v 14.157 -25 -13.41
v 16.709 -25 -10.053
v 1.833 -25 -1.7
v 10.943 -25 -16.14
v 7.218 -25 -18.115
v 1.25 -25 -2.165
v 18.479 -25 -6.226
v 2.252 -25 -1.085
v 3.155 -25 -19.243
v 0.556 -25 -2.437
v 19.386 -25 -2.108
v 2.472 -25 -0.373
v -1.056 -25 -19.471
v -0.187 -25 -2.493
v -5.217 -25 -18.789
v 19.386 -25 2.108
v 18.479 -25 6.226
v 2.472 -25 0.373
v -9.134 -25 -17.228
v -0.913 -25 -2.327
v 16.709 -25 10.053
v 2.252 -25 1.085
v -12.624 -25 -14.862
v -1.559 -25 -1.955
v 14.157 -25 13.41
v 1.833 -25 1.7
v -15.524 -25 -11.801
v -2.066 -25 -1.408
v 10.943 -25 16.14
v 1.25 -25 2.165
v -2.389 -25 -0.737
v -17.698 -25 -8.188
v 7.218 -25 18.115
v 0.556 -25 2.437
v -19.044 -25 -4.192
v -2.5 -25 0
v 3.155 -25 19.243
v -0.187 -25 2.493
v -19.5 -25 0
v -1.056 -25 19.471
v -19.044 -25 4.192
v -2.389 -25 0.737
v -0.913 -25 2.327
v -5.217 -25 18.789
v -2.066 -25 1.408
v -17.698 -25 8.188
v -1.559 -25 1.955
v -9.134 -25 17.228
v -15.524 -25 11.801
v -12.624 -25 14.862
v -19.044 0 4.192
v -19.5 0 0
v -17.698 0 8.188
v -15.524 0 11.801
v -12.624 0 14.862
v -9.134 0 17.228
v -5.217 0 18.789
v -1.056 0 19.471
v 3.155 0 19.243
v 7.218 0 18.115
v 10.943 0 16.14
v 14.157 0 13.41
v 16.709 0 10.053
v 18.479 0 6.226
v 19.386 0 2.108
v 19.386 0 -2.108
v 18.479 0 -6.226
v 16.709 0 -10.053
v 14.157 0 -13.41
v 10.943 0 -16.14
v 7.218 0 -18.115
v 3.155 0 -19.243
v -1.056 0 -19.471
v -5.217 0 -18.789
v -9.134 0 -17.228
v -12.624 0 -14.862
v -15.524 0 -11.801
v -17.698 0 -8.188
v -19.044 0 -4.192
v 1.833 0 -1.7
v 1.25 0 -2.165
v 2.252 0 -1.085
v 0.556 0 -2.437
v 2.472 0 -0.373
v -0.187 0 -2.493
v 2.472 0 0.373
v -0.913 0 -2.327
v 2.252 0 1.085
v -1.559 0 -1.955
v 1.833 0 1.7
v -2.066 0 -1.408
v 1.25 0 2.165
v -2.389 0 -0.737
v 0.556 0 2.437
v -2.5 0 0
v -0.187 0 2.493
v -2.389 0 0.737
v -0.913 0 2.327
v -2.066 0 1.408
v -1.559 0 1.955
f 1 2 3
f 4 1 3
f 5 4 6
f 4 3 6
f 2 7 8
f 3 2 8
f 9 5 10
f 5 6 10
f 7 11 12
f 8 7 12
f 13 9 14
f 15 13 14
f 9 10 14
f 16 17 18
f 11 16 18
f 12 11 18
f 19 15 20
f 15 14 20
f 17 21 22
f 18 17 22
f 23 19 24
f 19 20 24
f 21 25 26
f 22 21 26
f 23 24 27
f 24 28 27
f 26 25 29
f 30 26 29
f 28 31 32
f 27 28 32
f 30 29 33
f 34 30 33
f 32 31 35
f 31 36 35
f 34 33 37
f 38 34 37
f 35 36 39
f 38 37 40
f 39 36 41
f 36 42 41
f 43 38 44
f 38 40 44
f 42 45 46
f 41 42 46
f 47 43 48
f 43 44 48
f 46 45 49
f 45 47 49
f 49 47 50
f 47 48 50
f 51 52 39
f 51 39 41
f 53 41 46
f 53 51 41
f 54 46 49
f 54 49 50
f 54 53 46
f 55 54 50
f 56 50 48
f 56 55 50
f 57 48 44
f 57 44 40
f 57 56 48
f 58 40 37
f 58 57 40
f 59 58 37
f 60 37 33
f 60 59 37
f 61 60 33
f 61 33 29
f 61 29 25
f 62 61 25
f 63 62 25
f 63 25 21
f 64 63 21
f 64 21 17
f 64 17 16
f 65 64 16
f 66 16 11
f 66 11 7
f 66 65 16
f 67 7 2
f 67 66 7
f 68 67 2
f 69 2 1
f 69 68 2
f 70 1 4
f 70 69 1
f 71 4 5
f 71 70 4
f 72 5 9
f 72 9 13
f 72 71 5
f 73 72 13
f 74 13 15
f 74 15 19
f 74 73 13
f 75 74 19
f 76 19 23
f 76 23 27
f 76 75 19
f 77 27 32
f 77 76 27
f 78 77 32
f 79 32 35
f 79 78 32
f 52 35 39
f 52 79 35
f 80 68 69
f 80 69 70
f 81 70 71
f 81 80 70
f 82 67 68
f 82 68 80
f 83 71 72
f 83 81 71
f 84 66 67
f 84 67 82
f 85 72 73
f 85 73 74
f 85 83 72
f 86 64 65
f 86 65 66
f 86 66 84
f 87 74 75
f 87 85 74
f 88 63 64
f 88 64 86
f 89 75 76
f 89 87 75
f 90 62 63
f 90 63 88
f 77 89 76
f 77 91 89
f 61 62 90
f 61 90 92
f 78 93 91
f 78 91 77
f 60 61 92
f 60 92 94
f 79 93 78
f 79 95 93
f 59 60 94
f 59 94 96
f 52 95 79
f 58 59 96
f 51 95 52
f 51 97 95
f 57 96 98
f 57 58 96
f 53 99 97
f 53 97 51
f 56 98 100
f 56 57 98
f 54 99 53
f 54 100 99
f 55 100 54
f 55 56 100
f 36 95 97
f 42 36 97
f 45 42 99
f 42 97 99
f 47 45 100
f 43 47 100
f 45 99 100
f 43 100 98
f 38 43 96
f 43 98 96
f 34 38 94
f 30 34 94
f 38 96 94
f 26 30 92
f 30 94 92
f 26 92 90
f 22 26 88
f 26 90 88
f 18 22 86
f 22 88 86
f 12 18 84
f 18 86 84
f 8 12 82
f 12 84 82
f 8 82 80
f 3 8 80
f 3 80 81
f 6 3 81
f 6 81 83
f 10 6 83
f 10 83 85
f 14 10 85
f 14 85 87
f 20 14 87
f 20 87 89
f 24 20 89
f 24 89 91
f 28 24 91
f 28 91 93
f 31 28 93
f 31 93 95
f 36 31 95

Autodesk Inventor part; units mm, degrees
ref_plane "YZ Plane" through (0, 0, 0) normal (1, 0, 0) x (0, 1, 0)
ref_plane "XZ Plane" through (0, 0, 0) normal (0, 1, 0) x (-1, 0, 0)
ref_plane "XY Plane" through (0, 0, 0) normal (0, 0, 1) x (1, 0, 0)
sketch "Sketch1" plane through (0, 0, 0) normal (0, 1, 0) x (-1, 0, 0)
  circle A0 centre (0, 0) radius 17.5
  circle A1 centre (0, 0) radius 2.5
  dimension "d0" = 35
  dimension "d1" = 5
extrude "Extrusion1" add sketch "Sketch1" against normal blind 25
thicken "Thicken1" operation add thickness 1 both sides no extend neighbours yes toward (-0.9967573, 0, -0.0804666) faces at (-17.4433, -16.6667, -1.4082)
thicken "Thicken2" operation add thickness 1 both sides no extend neighbours yes toward (-0.9967573, 0, -0.0804666) faces at (-18.44, -16.6667, -1.4886)
properties part number "roller2 grp17"
